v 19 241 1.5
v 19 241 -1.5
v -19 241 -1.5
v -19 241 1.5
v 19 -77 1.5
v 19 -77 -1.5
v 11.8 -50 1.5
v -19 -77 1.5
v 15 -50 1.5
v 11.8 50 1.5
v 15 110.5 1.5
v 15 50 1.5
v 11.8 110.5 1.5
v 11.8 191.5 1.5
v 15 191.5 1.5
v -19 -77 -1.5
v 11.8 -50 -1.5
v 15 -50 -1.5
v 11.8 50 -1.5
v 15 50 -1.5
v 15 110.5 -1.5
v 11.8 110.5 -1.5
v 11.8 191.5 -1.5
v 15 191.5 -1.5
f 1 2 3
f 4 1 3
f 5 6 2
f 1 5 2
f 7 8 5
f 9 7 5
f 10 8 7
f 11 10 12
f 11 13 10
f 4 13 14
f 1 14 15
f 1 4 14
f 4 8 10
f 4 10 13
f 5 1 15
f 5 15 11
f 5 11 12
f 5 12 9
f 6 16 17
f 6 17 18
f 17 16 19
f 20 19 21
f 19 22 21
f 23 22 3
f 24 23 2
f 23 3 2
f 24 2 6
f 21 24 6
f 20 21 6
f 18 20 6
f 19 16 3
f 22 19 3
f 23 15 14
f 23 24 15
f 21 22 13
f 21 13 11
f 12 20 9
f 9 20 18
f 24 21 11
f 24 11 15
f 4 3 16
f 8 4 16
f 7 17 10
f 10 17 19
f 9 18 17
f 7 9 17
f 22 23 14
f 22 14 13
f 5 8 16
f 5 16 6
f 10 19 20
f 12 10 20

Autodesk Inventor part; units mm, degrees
ref_plane "YZ Plane" through (0, 0, 0) normal (1, 0, 0) x (0, 1, 0)
ref_plane "XZ Plane" through (0, 0, 0) normal (0, 1, 0) x (-1, 0, 0)
ref_plane "XY Plane" through (0, 0, 0) normal (0, 0, 1) x (1, 0, 0)
sketch "Sketch1" plane through (0, 0, 0) normal (0, 0, 1) x (1, 0, 0)
  line L0 (-19, -241) -> (19, -241)
  line L1 (19, -241) -> (19, 241)
  line L2 (19, 241) -> (-19, 241)
  line L3 (-19, 241) -> (-19, -241)
  line L4 (-19, -241) -> (19, 241) construction
  line L5 (19, -241) -> (-19, 241) construction
  line L6 (15, 191.5) -> (11.8, 191.5)
  line L7 (11.8, 191.5) -> (11.8, 110.5)
  line L8 (11.8, 110.5) -> (15, 110.5)
  line L9 (15, 110.5) -> (15, 191.5)
  line L10 (-19, 0) -> (19, 0)
  line L11 (0, 241) -> (0, -241)
  line L12 (11.8, 50) -> (15, 50)
  line L13 (15, 50) -> (15, -50)
  line L14 (15, -50) -> (11.8, -50)
  line L15 (11.8, -50) -> (11.8, 50)
  line L16 (-19, -131) -> (19, -131)
  point P0 (0, 0)
  point P1 (11.8, 0)
  point P2 (0, 0)
  dimension "d0" = 38
  dimension "d1" = 482
  dimension "d2" = 81
  dimension "d3" = 49.5
  dimension "d4" = 4
  dimension "d5" = 3.2
  dimension "d6" = 3.2
  dimension "d7" = 100
  dimension "d8" = 4
  dimension "d10" = 110
extrude "Plate1" add sketch "Sketch1" along normal mid plane 3 contours L3 L10 L11 L16 | L11 L10 L15 L14 L13 L1 L16 | L3 L2 L11 L10 | L11 L2 L1 L10 L13 L12 L15
sketch "Sketch3" plane through (0, 0, 1.5) normal (0, 0, 1) x (1, 0, 0)
  line L0 (-19, 241) -> (-19, -131) projected
  line L1 (-19, -77) -> (19, -77)
  line L2 (19, 241) -> (19, -131) projected
  line L3 (-19, 241) -> (19, 241) projected
  line L4 (-19, -77) -> (19, -77)
  line L5 (19, -77) -> (19, -131)
  line L6 (19, -131) -> (-19, -131)
  line L7 (-19, -131) -> (-19, -77)
  point P0 (0, 0)
  dimension "d17" = 318
extrude "Cut2" cut sketch "Sketch3" against normal blind 3 contours L1 L2 L6 L0
equation "\"d18\" = Thickness"
equation "\"d9\" = Thickness"
equation "\"BendRadius\" = Thickness"
equation "\"BendReliefWidth\" = Thickness"
equation "\"BendReliefDepth\" = 0.5 * Thickness"
equation "\"CornerReliefSize\" = 4 * Thickness"
equation "\"MinimumRemnant\" = 2 * Thickness"
equation "\"TransitionRadius\" = BendRadius"
equation "\"JacobiRadiusSize\" = BendRadius"
equation "\"GapSize\" = Thickness"
equation "\"Thickness\" = 3"
properties part number "Extension .3"
